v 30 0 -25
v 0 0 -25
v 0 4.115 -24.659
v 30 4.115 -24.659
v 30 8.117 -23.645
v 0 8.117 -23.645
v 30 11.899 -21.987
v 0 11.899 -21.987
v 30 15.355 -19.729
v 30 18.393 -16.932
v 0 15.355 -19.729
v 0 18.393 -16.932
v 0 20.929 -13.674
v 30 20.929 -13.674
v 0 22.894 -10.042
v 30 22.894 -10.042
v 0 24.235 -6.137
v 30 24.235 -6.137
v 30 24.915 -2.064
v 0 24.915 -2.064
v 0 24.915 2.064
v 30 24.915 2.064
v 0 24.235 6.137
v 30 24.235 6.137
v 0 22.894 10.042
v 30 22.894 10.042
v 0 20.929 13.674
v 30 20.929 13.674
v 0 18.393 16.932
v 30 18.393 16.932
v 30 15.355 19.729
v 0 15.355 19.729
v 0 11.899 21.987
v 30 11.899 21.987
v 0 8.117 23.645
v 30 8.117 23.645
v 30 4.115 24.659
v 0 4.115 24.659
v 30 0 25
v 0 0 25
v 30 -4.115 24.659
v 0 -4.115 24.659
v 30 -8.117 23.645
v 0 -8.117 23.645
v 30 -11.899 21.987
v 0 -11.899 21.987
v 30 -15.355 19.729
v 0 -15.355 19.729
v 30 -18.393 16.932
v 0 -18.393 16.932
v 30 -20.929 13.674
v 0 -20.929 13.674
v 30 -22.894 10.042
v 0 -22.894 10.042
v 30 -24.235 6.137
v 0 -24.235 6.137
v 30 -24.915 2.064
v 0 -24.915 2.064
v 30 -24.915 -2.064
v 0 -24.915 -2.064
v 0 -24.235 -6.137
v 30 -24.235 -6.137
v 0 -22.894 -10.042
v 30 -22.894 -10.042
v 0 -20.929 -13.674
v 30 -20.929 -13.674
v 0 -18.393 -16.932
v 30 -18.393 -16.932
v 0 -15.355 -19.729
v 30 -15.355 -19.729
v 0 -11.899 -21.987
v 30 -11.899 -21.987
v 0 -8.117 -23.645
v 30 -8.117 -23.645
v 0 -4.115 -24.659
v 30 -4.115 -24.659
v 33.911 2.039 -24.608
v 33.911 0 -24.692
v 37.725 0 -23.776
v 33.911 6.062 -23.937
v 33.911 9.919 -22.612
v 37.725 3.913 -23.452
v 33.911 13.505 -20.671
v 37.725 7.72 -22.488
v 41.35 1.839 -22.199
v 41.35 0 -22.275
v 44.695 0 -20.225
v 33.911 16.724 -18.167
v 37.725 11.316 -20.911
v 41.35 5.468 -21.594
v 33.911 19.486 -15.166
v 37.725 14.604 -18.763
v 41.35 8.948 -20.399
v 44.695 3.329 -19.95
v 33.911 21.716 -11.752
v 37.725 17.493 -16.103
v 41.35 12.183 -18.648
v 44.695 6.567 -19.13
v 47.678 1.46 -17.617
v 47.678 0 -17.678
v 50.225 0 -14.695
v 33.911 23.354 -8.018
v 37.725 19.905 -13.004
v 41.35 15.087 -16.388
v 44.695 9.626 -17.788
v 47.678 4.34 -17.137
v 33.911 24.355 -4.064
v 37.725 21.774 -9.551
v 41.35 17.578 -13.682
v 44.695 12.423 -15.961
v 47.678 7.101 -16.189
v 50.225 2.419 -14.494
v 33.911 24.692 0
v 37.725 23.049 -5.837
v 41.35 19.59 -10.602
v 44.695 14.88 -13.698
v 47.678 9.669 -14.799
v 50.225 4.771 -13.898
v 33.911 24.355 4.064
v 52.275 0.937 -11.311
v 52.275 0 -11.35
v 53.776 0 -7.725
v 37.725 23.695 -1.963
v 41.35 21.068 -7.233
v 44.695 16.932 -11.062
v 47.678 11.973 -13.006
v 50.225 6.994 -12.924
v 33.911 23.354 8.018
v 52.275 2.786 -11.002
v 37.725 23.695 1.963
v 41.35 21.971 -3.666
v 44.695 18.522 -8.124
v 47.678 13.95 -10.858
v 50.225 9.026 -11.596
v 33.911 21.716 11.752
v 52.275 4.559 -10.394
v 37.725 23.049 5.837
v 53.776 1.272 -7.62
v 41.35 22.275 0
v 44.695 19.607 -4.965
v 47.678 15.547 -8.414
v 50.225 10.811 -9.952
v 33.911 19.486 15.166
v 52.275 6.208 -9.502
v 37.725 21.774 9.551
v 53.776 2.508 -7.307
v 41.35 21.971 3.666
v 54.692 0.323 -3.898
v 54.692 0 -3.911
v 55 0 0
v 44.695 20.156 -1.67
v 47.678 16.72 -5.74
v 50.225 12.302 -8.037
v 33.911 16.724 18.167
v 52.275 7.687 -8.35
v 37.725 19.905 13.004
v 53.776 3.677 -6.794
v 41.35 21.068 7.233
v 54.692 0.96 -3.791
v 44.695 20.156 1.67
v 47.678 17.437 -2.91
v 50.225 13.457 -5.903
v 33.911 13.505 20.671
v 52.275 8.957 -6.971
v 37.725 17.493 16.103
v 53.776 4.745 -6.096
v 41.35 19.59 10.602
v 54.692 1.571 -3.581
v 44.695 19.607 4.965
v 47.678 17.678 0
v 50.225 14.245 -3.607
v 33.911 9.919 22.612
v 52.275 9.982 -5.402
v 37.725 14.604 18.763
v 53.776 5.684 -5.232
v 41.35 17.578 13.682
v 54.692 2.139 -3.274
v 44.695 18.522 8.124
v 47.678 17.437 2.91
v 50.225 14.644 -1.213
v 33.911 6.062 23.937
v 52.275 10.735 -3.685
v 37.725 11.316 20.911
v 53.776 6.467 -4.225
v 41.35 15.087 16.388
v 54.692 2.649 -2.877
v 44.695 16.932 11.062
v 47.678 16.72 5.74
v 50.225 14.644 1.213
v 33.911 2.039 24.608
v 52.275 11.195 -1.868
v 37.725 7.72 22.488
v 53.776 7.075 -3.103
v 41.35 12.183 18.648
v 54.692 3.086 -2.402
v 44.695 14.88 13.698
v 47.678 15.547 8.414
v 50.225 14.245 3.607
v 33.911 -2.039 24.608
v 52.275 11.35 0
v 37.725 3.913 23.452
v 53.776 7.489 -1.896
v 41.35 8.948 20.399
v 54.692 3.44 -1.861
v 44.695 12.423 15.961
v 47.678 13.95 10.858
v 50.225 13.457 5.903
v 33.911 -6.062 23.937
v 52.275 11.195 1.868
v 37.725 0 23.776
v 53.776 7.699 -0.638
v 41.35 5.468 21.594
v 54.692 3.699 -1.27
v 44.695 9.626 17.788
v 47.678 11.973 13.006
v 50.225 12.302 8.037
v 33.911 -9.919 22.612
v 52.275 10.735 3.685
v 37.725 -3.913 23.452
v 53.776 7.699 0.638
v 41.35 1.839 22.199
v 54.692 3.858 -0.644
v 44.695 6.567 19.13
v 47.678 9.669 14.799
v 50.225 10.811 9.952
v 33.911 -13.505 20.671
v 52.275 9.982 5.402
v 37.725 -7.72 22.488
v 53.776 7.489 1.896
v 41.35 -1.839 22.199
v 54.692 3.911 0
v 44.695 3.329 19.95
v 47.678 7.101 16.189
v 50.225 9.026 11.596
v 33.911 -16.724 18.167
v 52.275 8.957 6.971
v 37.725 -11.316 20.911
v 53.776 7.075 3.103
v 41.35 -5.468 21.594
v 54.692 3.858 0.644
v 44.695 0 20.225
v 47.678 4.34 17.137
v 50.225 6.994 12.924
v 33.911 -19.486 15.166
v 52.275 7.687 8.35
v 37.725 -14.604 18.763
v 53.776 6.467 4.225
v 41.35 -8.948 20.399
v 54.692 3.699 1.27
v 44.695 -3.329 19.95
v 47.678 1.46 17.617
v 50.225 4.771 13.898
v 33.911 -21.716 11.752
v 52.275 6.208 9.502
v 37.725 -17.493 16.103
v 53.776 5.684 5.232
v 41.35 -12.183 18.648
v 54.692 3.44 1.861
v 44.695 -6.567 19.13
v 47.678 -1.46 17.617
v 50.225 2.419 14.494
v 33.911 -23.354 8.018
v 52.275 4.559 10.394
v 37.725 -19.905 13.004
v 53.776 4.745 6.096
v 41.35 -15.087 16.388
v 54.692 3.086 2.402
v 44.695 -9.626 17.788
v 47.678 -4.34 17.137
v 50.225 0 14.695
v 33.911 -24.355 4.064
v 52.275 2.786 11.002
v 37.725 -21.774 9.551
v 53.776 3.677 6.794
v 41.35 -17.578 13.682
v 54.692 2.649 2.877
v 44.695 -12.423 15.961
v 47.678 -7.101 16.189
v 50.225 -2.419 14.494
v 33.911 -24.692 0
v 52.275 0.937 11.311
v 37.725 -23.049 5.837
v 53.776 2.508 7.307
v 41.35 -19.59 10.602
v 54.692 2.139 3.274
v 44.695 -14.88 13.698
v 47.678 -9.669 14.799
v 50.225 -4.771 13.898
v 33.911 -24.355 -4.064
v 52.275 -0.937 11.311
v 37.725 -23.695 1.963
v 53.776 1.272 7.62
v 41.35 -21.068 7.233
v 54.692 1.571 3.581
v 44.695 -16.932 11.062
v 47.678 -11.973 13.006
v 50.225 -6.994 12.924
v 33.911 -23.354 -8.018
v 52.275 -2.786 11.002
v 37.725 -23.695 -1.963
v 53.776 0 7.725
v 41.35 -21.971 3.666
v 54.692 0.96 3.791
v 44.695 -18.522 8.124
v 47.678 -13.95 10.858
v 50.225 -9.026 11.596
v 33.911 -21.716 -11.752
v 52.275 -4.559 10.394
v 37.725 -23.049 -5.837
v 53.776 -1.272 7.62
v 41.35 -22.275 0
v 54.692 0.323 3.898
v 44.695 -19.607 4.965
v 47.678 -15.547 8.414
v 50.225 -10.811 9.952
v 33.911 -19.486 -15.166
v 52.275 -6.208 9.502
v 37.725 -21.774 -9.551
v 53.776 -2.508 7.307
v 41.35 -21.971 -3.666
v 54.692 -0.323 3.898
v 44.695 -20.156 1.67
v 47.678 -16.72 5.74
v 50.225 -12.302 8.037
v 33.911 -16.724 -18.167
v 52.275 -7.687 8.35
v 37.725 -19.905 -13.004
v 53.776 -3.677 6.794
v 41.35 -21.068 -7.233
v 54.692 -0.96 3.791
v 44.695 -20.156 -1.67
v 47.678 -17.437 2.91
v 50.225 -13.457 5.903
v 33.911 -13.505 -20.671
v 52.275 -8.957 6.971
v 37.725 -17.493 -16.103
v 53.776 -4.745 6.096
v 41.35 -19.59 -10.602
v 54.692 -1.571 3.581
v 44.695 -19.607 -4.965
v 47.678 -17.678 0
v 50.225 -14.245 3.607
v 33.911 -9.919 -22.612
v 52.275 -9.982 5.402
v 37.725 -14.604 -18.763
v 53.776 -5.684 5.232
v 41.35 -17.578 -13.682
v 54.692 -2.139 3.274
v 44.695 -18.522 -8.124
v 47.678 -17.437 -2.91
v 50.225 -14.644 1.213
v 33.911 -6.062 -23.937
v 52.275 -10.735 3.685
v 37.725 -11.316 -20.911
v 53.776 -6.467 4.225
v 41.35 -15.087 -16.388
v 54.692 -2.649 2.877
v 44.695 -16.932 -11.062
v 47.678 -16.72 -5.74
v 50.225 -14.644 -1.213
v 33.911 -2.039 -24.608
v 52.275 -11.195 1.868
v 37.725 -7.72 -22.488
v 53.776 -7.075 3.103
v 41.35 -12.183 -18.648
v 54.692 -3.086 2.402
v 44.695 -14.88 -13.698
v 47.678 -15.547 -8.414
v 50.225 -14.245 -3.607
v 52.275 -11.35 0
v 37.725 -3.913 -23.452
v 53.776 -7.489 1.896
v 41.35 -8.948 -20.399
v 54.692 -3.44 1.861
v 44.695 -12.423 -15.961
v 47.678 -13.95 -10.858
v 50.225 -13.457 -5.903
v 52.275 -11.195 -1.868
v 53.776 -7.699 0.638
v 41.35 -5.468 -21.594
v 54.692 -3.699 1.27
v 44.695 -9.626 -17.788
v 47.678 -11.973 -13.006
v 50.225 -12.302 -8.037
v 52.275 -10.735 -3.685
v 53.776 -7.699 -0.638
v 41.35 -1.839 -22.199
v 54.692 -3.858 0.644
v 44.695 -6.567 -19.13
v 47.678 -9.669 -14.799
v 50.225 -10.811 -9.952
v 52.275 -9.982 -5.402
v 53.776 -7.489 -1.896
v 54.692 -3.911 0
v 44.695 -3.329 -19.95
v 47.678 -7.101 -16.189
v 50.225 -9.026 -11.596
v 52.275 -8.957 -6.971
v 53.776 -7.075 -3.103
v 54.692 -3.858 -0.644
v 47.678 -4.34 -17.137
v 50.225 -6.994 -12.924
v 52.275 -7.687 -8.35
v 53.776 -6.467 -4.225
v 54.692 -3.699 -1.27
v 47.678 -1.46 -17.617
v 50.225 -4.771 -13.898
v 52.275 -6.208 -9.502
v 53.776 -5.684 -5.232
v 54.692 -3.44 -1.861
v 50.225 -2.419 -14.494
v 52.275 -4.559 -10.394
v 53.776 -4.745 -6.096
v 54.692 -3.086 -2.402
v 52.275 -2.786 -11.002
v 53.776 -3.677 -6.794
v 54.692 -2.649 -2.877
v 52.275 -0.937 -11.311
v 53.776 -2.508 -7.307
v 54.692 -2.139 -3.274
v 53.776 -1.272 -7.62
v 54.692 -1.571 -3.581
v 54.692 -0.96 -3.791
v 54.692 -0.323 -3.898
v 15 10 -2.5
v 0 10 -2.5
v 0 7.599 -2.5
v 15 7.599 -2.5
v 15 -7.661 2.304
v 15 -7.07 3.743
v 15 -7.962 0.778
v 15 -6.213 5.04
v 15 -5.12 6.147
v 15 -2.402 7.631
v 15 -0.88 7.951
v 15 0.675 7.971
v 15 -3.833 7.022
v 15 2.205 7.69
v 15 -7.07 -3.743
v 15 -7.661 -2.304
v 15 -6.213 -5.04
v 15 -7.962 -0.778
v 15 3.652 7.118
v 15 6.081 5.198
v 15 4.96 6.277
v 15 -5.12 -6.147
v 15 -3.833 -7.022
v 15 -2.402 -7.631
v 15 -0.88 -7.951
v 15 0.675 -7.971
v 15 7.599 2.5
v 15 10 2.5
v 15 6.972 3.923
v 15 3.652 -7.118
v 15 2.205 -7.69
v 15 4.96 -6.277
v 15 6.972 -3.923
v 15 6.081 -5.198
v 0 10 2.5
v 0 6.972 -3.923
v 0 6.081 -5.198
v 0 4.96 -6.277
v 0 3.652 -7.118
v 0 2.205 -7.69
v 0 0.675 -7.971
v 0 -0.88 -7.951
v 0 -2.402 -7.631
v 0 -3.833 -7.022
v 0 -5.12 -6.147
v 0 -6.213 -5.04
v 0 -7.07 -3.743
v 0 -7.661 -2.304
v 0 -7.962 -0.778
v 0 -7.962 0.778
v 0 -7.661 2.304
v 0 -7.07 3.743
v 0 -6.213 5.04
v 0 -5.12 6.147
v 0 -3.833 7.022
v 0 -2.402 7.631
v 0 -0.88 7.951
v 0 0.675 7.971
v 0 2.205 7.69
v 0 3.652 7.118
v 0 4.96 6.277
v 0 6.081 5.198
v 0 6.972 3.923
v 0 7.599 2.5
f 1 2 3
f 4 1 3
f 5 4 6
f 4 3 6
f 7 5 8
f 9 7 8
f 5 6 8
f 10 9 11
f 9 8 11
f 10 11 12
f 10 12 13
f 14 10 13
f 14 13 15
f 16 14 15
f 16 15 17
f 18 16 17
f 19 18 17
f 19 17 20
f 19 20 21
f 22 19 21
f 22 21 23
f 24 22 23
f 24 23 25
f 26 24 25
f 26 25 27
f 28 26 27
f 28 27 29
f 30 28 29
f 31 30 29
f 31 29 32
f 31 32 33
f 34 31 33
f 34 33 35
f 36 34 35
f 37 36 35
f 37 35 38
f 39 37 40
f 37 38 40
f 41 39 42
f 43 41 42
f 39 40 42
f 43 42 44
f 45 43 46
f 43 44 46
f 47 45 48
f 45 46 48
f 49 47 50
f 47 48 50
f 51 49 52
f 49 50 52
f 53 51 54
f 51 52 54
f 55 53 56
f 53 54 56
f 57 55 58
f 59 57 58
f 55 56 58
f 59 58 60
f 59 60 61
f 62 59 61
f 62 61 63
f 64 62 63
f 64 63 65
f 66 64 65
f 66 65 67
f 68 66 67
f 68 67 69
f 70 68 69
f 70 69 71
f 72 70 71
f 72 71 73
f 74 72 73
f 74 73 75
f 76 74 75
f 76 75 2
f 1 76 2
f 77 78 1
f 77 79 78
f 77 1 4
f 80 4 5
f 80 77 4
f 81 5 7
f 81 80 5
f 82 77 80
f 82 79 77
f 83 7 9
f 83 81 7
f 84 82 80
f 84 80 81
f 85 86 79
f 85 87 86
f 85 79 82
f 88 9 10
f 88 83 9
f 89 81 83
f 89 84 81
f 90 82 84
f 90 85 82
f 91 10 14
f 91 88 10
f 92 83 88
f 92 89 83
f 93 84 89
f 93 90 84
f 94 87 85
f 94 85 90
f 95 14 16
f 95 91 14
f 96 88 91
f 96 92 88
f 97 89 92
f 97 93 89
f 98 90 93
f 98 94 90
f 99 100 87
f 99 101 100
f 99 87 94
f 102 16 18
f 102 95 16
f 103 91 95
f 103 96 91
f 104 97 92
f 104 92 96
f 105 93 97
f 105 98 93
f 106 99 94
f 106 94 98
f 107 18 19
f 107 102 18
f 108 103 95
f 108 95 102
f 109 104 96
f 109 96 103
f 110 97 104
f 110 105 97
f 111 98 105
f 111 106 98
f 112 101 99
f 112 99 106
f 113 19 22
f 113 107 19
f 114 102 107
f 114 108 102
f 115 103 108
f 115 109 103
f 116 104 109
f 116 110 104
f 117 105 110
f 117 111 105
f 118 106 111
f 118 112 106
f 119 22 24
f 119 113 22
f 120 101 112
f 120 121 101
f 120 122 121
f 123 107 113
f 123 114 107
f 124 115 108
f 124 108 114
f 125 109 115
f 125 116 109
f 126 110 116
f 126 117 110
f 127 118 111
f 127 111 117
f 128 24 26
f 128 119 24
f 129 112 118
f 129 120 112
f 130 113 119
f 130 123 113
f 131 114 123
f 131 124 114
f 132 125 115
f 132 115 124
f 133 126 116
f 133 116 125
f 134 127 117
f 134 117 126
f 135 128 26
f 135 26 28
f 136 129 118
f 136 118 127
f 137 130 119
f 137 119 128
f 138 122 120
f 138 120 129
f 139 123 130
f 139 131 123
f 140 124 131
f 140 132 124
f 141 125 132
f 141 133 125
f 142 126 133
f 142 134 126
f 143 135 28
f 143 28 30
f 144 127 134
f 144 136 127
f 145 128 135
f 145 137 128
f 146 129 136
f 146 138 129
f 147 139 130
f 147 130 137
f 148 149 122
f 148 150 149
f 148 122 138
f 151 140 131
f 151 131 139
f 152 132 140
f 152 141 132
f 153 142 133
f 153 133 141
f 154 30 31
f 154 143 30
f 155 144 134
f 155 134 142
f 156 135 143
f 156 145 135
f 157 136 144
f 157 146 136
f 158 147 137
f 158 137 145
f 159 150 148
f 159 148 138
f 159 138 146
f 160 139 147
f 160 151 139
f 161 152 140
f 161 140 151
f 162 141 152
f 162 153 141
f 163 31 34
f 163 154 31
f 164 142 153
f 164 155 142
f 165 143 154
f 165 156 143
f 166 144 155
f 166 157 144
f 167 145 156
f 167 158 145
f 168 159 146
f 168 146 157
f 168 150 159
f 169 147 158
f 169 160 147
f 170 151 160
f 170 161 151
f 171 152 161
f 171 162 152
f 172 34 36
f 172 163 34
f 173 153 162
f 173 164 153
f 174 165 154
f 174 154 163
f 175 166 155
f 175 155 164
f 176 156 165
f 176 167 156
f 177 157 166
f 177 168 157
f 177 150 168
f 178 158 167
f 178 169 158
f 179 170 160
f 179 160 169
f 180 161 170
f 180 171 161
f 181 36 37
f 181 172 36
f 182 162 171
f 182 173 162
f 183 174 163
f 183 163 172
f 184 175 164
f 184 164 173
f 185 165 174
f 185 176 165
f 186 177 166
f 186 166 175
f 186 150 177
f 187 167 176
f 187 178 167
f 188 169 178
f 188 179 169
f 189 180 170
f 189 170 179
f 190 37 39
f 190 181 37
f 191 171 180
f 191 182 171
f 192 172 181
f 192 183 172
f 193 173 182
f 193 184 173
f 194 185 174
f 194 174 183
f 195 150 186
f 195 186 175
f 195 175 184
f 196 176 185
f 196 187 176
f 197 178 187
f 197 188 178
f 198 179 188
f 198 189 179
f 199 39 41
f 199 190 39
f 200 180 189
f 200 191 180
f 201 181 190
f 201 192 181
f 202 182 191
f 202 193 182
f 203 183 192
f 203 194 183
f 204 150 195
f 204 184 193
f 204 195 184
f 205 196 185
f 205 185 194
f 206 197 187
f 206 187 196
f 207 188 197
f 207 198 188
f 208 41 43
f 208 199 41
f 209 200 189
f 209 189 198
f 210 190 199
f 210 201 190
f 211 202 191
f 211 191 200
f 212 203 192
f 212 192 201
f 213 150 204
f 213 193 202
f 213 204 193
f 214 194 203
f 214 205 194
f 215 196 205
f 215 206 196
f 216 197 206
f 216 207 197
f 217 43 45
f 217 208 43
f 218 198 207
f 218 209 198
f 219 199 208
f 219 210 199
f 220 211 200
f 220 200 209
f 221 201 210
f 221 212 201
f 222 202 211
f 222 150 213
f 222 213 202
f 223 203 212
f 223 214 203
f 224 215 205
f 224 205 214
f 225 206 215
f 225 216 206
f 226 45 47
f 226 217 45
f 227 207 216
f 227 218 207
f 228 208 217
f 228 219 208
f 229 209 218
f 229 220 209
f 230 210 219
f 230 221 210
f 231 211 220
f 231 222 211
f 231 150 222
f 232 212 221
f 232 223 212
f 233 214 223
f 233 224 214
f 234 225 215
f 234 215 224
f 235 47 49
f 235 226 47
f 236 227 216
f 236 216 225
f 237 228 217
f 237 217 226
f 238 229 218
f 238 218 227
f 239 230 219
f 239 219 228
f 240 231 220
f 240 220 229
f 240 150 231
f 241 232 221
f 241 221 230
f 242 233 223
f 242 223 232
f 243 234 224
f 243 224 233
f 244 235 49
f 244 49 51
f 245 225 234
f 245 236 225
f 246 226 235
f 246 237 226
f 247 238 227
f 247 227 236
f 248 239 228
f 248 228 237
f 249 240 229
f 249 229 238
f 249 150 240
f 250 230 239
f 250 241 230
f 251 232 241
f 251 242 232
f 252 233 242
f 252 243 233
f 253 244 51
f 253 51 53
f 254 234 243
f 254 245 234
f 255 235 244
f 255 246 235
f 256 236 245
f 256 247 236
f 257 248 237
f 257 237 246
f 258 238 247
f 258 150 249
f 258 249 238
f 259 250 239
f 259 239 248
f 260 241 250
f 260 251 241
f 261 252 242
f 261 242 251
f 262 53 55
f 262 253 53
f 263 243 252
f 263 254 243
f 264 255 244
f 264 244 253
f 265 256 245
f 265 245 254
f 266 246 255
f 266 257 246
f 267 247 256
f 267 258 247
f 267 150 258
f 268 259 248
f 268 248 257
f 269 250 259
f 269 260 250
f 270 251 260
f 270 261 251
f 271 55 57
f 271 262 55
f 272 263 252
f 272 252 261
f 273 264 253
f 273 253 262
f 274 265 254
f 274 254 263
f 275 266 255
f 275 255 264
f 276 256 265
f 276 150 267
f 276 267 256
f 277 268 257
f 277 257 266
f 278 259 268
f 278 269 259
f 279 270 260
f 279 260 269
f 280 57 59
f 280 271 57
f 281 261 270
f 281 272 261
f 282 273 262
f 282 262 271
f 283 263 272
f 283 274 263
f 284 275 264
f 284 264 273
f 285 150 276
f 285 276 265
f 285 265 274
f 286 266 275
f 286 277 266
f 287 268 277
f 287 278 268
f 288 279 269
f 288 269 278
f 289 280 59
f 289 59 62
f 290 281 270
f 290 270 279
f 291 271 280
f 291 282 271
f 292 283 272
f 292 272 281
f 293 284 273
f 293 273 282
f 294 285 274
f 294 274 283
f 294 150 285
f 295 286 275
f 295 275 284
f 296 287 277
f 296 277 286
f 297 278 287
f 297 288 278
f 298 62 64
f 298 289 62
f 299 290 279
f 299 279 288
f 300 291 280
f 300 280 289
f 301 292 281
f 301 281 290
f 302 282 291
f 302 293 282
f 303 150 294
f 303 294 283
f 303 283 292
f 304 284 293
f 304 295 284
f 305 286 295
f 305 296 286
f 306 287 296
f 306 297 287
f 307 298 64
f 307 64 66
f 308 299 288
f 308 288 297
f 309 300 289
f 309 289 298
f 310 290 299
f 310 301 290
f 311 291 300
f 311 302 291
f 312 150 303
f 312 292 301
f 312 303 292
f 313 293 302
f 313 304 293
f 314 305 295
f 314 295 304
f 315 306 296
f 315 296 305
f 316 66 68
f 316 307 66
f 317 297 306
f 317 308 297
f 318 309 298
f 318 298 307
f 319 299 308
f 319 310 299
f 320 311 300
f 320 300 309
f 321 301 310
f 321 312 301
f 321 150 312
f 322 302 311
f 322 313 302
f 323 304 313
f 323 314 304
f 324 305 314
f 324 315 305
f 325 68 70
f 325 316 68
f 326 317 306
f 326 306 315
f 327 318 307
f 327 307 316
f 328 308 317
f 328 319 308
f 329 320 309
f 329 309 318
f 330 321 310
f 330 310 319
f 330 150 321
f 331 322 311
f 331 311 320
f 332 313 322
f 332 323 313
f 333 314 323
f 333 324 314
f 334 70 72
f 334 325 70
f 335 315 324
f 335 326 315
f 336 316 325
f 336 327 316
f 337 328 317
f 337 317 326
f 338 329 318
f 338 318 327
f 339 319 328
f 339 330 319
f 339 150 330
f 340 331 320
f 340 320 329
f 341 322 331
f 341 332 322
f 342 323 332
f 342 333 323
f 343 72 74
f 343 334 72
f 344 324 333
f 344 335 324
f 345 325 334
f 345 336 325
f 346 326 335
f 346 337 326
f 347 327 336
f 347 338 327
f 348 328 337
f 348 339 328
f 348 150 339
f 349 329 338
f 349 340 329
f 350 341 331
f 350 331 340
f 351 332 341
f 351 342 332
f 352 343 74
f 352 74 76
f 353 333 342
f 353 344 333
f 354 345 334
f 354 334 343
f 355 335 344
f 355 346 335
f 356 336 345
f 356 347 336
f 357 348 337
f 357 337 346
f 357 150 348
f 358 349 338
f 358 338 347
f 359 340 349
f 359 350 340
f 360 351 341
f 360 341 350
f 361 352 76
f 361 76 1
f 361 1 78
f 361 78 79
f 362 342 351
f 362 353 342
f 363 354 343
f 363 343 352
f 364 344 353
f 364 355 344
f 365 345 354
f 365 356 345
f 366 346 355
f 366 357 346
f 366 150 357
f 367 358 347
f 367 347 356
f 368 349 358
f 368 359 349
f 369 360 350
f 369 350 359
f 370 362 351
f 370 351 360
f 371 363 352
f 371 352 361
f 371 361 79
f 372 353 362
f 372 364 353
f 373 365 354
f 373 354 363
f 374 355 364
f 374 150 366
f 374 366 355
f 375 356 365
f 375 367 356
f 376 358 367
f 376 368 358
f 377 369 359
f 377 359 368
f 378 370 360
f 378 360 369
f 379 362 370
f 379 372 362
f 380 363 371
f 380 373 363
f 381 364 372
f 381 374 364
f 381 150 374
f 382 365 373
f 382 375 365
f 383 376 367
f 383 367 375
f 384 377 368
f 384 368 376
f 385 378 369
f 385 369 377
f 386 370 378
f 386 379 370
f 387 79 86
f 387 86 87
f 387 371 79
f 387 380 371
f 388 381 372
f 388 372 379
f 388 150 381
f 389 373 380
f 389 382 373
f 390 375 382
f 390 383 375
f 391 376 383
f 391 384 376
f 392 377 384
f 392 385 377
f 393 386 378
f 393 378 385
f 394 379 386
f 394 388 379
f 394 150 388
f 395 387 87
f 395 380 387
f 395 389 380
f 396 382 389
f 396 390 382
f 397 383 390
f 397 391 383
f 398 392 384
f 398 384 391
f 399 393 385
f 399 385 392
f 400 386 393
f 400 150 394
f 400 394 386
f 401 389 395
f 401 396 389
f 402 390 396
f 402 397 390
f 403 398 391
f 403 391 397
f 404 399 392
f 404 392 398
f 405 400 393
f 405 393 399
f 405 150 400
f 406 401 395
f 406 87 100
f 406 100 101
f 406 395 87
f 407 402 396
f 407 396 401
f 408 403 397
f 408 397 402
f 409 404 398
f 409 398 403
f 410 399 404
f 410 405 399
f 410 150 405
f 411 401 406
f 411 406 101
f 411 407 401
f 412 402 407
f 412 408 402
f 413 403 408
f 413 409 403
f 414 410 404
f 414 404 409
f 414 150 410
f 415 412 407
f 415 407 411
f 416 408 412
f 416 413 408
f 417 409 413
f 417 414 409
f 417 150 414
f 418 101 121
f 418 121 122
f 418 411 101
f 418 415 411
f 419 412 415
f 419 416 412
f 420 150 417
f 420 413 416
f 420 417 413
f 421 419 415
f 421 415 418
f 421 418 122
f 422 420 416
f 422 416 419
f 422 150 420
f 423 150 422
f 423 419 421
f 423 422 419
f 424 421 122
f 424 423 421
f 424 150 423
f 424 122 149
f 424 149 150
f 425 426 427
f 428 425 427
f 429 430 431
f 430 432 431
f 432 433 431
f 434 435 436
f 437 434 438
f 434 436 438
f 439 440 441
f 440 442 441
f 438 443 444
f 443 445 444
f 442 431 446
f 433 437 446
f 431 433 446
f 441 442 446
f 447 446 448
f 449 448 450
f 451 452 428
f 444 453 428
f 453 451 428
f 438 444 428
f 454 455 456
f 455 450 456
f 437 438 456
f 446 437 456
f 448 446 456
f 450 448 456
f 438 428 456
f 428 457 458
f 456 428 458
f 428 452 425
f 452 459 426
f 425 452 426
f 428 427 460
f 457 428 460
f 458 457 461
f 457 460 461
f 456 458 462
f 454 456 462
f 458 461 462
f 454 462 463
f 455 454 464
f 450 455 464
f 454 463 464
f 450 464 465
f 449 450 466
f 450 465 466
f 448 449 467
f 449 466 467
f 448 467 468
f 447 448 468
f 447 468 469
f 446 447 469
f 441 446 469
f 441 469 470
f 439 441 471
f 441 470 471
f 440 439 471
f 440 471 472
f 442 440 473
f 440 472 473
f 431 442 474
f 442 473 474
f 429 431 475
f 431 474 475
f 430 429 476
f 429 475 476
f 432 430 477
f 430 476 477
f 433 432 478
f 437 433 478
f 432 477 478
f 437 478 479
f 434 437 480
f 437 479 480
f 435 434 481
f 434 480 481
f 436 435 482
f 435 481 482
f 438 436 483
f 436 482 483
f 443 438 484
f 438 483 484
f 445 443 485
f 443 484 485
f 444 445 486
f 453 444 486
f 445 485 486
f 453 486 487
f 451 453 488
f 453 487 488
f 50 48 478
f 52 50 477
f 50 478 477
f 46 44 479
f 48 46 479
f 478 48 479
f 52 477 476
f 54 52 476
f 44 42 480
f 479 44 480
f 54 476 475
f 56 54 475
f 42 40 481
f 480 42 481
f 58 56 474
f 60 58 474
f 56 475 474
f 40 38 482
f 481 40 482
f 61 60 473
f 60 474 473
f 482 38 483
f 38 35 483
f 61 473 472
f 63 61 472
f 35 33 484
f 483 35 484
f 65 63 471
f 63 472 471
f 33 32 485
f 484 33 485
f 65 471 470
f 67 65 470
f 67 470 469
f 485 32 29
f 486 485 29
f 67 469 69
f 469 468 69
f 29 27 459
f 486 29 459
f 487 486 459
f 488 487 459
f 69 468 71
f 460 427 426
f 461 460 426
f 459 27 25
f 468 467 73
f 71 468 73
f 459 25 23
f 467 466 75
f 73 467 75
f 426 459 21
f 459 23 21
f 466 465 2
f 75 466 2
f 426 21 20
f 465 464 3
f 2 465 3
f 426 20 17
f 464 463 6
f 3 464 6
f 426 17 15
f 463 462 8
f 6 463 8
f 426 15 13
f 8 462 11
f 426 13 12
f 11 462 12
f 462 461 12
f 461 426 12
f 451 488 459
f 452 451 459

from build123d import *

# Parameters (mm, degrees)
SKETCH1_R           = 25
BOSS_EXTRUDE1_DEPTH = 15
SKETCH2_R           = 25
BOSS_EXTRUDE2_DEPTH = 40
FILLET1_R           = 25


with BuildPart() as part:
    # Sketch1 → Boss-Extrude1 (new body)
    with BuildSketch(Plane(origin=(0, 0, 0), x_dir=(0, 0, -1), z_dir=(1, 0, 0))):
        Circle(SKETCH1_R)
        with BuildLine():
            Line((-2.5, 10), (2.5, 10))
            Line((2.5, 10), (2.5, 7.599342077))
            ThreePointArc((2.5, 7.599342077), (0, -8), (-2.5, 7.599342077))
            Line((-2.5, 7.599342077), (-2.5, 10))
        make_face(mode=Mode.SUBTRACT)
    extrude(amount=BOSS_EXTRUDE1_DEPTH)

    # Sketch2 → Boss-Extrude2 (add)
    with BuildSketch(Plane(origin=(15, 0, 0), x_dir=(0, 0, -1), z_dir=(1, 0, 0))):
        Circle(SKETCH2_R)
    extrude(amount=BOSS_EXTRUDE2_DEPTH)

    # Fillet1
    fillet1_edges = [part.edges().sort_by_distance(p)[0] for p in [
        (55, 0, 25),
    ]]
    fillet(fillet1_edges, radius=FILLET1_R)


solid = part.part
